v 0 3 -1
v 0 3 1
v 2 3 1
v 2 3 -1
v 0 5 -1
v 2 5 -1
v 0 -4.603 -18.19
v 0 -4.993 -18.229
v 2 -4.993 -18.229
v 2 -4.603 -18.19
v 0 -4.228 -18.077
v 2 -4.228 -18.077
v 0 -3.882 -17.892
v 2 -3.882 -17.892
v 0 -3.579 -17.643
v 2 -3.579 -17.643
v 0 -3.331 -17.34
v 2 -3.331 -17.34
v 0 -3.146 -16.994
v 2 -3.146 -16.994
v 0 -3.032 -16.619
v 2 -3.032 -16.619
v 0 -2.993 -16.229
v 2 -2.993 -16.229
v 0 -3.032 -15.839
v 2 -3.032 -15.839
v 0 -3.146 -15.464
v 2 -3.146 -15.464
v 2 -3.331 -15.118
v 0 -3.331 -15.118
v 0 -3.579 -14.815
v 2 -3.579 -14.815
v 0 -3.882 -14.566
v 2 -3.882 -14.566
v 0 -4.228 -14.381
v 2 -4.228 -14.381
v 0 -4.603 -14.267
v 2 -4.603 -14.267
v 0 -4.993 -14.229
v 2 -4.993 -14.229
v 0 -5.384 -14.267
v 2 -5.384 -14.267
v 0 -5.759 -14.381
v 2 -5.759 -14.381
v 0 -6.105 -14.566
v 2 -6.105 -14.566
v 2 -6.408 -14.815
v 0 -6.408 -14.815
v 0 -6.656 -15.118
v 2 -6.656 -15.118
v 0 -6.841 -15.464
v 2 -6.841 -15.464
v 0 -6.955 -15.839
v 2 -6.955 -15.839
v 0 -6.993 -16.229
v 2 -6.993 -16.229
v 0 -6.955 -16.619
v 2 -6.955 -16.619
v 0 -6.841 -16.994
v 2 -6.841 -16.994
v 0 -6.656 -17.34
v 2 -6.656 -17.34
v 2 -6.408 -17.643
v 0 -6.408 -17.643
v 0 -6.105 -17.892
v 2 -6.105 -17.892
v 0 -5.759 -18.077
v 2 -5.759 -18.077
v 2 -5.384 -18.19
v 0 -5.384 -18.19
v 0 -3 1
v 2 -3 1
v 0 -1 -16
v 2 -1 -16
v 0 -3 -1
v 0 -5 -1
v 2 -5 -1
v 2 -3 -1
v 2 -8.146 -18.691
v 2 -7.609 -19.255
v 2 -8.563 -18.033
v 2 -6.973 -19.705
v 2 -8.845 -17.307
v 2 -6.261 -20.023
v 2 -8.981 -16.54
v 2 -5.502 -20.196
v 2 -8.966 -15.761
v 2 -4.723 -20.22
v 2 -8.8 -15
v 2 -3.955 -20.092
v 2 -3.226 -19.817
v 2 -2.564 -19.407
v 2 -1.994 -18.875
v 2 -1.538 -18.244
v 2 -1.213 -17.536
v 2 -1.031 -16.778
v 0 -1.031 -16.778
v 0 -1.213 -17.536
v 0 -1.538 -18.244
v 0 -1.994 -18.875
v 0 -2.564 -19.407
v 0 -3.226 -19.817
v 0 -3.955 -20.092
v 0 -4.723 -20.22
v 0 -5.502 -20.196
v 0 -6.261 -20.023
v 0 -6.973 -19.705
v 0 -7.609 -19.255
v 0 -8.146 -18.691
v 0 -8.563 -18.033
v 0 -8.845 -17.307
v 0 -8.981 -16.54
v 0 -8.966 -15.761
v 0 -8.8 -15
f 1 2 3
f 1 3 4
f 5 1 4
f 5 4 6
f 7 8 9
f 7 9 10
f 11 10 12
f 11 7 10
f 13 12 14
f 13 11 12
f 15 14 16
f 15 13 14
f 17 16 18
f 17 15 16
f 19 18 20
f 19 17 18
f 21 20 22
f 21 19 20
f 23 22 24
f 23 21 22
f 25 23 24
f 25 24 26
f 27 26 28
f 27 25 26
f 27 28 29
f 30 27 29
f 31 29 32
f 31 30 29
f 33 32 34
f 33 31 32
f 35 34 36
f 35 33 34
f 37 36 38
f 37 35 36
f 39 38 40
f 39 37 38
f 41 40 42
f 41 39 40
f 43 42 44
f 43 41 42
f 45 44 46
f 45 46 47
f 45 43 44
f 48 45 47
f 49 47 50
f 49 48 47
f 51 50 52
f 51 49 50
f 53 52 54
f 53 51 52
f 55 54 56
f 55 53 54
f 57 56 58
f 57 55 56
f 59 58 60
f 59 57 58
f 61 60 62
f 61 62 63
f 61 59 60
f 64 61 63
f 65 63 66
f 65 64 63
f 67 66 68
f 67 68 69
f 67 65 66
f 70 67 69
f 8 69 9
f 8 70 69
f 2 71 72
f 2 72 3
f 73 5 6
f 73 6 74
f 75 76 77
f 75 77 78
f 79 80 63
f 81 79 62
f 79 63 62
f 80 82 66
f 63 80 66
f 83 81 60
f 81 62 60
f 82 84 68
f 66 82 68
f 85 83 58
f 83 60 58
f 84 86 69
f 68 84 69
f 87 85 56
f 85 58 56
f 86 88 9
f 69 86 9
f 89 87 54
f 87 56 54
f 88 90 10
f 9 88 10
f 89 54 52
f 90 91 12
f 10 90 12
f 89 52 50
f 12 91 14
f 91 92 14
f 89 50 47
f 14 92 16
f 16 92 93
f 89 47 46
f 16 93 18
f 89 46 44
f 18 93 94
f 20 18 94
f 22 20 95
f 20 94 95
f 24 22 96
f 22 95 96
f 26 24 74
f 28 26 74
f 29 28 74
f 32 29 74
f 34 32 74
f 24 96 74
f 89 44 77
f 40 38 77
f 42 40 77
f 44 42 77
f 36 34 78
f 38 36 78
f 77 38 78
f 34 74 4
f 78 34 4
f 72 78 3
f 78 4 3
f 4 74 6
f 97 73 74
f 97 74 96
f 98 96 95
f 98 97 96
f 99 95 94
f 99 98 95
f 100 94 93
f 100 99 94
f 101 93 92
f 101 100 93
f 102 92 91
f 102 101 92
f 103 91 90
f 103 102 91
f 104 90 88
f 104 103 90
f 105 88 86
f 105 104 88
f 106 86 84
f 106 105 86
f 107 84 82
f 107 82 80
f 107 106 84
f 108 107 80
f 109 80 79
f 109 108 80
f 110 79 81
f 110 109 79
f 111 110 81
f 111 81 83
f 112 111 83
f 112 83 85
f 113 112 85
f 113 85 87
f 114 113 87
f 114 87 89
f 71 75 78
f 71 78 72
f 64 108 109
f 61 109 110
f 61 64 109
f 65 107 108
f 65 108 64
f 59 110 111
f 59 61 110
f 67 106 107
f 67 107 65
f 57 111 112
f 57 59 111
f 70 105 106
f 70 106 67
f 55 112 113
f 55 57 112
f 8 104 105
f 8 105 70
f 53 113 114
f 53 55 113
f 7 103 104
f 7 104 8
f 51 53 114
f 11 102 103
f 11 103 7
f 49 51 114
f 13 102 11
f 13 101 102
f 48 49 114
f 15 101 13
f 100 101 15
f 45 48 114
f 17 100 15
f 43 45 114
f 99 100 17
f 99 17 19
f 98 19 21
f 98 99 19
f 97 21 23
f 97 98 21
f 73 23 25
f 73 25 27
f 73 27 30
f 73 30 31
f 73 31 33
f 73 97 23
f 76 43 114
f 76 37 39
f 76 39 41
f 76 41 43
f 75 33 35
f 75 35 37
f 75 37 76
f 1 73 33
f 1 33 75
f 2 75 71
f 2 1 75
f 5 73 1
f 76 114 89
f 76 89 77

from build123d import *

# Parameters (mm, degrees)
SKETCH1_R           = 2
BOSS_EXTRUDE1_DEPTH = 2


with BuildPart() as part:
    # Sketch1 → Boss-Extrude1 (new body)
    with BuildSketch(Plane(origin=(0, 0, 0), x_dir=(0, 0, -1), z_dir=(1, 0, 0))):
        with BuildLine():
            Line((1, -5), (1, -3))
            Line((1, -3), (-1, -3))
            Line((-1, -3), (-1, 3))
            Line((-1, 3), (1, 3))
            Line((1, 3), (1, 5))
            Line((1, 5), (16, -1))
            ThreePointArc((16, -1), (20.196407848, -5.50210357), (15, -8.8))
            Line((15, -8.8), (1, -5))
        make_face()
        with Locations((16.228881189, -4.993446306)):
            Circle(SKETCH1_R, mode=Mode.SUBTRACT)
    extrude(amount=BOSS_EXTRUDE1_DEPTH)


solid = part.part
